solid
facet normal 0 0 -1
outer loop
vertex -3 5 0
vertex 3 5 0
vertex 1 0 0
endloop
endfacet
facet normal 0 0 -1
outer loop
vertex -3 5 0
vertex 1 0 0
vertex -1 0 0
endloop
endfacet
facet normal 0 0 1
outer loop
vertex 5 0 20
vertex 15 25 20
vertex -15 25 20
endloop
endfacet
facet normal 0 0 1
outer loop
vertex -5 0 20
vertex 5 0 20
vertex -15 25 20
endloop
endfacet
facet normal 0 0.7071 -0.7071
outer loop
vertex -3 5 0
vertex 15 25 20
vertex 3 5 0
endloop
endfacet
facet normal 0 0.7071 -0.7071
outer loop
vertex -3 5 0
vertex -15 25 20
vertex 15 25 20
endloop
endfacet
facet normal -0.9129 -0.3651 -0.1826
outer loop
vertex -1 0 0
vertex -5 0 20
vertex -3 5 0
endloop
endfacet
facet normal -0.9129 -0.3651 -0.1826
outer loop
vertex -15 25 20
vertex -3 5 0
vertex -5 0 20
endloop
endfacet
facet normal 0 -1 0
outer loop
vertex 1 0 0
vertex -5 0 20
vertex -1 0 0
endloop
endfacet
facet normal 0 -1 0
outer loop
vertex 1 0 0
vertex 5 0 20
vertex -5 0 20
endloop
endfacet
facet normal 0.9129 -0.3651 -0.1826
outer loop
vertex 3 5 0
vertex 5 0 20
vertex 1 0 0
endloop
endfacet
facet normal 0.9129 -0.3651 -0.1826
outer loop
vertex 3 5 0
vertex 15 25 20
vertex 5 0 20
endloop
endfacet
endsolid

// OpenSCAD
// file: joiner.scad
/*
snippet DOC

= Joiner

A geometric shape that can be used as a positive on one piece and a negative on the other and these two parts can be joined together to form a new shape.
This can provide a removable connection between two pieces.

The actual structure looks like the following:

image::joiner-1.png[]

The base of the joiner is a paralellogramma.
The parallel sides of the paralellogramma are `neck` and `shoulder`.
The neck is the narrower (smaller value) and the shoulder is the wider (larger value).

The vertical size of the structure is `height`.

[source,scad]
----
{%@snip code%}
----

When using 3D printing there is a small epsilon value to be added to the structures.
This epsilon value makes the shape sink into the other shape and also make the negative counterpart a bit smaller.
If the eplison offset is the same for bot of the shapes then the two shapes will fit together perfectly.

No.translateThey will not due to the fact that the 3D printer is not perfect and the two shapes will not fit together perfectly.

The angle of the paralellogramma at the bottom is the same as at the top, thereore the two sides are parallel.

end snippet
*/

// snippet code
module joiner(neck, shoulder, depth, height, scale=1.2) {

    leftOut = [- neck / 2, 0];
    rightOut = [neck / 2, 0];
    leftIn = [- shoulder / 2, depth];
    rightIn = [shoulder / 2, depth];
    linear_extrude(height = height, scale = scale)
        polygon(points = [leftOut, rightOut, rightIn, leftIn]);
}
// end snippet
// main file
include <joiner.scad>

height = 20;
depth = 5;
neck = 2;
shoulder = 6;

joiner(neck, shoulder, depth, height, scale=5);
